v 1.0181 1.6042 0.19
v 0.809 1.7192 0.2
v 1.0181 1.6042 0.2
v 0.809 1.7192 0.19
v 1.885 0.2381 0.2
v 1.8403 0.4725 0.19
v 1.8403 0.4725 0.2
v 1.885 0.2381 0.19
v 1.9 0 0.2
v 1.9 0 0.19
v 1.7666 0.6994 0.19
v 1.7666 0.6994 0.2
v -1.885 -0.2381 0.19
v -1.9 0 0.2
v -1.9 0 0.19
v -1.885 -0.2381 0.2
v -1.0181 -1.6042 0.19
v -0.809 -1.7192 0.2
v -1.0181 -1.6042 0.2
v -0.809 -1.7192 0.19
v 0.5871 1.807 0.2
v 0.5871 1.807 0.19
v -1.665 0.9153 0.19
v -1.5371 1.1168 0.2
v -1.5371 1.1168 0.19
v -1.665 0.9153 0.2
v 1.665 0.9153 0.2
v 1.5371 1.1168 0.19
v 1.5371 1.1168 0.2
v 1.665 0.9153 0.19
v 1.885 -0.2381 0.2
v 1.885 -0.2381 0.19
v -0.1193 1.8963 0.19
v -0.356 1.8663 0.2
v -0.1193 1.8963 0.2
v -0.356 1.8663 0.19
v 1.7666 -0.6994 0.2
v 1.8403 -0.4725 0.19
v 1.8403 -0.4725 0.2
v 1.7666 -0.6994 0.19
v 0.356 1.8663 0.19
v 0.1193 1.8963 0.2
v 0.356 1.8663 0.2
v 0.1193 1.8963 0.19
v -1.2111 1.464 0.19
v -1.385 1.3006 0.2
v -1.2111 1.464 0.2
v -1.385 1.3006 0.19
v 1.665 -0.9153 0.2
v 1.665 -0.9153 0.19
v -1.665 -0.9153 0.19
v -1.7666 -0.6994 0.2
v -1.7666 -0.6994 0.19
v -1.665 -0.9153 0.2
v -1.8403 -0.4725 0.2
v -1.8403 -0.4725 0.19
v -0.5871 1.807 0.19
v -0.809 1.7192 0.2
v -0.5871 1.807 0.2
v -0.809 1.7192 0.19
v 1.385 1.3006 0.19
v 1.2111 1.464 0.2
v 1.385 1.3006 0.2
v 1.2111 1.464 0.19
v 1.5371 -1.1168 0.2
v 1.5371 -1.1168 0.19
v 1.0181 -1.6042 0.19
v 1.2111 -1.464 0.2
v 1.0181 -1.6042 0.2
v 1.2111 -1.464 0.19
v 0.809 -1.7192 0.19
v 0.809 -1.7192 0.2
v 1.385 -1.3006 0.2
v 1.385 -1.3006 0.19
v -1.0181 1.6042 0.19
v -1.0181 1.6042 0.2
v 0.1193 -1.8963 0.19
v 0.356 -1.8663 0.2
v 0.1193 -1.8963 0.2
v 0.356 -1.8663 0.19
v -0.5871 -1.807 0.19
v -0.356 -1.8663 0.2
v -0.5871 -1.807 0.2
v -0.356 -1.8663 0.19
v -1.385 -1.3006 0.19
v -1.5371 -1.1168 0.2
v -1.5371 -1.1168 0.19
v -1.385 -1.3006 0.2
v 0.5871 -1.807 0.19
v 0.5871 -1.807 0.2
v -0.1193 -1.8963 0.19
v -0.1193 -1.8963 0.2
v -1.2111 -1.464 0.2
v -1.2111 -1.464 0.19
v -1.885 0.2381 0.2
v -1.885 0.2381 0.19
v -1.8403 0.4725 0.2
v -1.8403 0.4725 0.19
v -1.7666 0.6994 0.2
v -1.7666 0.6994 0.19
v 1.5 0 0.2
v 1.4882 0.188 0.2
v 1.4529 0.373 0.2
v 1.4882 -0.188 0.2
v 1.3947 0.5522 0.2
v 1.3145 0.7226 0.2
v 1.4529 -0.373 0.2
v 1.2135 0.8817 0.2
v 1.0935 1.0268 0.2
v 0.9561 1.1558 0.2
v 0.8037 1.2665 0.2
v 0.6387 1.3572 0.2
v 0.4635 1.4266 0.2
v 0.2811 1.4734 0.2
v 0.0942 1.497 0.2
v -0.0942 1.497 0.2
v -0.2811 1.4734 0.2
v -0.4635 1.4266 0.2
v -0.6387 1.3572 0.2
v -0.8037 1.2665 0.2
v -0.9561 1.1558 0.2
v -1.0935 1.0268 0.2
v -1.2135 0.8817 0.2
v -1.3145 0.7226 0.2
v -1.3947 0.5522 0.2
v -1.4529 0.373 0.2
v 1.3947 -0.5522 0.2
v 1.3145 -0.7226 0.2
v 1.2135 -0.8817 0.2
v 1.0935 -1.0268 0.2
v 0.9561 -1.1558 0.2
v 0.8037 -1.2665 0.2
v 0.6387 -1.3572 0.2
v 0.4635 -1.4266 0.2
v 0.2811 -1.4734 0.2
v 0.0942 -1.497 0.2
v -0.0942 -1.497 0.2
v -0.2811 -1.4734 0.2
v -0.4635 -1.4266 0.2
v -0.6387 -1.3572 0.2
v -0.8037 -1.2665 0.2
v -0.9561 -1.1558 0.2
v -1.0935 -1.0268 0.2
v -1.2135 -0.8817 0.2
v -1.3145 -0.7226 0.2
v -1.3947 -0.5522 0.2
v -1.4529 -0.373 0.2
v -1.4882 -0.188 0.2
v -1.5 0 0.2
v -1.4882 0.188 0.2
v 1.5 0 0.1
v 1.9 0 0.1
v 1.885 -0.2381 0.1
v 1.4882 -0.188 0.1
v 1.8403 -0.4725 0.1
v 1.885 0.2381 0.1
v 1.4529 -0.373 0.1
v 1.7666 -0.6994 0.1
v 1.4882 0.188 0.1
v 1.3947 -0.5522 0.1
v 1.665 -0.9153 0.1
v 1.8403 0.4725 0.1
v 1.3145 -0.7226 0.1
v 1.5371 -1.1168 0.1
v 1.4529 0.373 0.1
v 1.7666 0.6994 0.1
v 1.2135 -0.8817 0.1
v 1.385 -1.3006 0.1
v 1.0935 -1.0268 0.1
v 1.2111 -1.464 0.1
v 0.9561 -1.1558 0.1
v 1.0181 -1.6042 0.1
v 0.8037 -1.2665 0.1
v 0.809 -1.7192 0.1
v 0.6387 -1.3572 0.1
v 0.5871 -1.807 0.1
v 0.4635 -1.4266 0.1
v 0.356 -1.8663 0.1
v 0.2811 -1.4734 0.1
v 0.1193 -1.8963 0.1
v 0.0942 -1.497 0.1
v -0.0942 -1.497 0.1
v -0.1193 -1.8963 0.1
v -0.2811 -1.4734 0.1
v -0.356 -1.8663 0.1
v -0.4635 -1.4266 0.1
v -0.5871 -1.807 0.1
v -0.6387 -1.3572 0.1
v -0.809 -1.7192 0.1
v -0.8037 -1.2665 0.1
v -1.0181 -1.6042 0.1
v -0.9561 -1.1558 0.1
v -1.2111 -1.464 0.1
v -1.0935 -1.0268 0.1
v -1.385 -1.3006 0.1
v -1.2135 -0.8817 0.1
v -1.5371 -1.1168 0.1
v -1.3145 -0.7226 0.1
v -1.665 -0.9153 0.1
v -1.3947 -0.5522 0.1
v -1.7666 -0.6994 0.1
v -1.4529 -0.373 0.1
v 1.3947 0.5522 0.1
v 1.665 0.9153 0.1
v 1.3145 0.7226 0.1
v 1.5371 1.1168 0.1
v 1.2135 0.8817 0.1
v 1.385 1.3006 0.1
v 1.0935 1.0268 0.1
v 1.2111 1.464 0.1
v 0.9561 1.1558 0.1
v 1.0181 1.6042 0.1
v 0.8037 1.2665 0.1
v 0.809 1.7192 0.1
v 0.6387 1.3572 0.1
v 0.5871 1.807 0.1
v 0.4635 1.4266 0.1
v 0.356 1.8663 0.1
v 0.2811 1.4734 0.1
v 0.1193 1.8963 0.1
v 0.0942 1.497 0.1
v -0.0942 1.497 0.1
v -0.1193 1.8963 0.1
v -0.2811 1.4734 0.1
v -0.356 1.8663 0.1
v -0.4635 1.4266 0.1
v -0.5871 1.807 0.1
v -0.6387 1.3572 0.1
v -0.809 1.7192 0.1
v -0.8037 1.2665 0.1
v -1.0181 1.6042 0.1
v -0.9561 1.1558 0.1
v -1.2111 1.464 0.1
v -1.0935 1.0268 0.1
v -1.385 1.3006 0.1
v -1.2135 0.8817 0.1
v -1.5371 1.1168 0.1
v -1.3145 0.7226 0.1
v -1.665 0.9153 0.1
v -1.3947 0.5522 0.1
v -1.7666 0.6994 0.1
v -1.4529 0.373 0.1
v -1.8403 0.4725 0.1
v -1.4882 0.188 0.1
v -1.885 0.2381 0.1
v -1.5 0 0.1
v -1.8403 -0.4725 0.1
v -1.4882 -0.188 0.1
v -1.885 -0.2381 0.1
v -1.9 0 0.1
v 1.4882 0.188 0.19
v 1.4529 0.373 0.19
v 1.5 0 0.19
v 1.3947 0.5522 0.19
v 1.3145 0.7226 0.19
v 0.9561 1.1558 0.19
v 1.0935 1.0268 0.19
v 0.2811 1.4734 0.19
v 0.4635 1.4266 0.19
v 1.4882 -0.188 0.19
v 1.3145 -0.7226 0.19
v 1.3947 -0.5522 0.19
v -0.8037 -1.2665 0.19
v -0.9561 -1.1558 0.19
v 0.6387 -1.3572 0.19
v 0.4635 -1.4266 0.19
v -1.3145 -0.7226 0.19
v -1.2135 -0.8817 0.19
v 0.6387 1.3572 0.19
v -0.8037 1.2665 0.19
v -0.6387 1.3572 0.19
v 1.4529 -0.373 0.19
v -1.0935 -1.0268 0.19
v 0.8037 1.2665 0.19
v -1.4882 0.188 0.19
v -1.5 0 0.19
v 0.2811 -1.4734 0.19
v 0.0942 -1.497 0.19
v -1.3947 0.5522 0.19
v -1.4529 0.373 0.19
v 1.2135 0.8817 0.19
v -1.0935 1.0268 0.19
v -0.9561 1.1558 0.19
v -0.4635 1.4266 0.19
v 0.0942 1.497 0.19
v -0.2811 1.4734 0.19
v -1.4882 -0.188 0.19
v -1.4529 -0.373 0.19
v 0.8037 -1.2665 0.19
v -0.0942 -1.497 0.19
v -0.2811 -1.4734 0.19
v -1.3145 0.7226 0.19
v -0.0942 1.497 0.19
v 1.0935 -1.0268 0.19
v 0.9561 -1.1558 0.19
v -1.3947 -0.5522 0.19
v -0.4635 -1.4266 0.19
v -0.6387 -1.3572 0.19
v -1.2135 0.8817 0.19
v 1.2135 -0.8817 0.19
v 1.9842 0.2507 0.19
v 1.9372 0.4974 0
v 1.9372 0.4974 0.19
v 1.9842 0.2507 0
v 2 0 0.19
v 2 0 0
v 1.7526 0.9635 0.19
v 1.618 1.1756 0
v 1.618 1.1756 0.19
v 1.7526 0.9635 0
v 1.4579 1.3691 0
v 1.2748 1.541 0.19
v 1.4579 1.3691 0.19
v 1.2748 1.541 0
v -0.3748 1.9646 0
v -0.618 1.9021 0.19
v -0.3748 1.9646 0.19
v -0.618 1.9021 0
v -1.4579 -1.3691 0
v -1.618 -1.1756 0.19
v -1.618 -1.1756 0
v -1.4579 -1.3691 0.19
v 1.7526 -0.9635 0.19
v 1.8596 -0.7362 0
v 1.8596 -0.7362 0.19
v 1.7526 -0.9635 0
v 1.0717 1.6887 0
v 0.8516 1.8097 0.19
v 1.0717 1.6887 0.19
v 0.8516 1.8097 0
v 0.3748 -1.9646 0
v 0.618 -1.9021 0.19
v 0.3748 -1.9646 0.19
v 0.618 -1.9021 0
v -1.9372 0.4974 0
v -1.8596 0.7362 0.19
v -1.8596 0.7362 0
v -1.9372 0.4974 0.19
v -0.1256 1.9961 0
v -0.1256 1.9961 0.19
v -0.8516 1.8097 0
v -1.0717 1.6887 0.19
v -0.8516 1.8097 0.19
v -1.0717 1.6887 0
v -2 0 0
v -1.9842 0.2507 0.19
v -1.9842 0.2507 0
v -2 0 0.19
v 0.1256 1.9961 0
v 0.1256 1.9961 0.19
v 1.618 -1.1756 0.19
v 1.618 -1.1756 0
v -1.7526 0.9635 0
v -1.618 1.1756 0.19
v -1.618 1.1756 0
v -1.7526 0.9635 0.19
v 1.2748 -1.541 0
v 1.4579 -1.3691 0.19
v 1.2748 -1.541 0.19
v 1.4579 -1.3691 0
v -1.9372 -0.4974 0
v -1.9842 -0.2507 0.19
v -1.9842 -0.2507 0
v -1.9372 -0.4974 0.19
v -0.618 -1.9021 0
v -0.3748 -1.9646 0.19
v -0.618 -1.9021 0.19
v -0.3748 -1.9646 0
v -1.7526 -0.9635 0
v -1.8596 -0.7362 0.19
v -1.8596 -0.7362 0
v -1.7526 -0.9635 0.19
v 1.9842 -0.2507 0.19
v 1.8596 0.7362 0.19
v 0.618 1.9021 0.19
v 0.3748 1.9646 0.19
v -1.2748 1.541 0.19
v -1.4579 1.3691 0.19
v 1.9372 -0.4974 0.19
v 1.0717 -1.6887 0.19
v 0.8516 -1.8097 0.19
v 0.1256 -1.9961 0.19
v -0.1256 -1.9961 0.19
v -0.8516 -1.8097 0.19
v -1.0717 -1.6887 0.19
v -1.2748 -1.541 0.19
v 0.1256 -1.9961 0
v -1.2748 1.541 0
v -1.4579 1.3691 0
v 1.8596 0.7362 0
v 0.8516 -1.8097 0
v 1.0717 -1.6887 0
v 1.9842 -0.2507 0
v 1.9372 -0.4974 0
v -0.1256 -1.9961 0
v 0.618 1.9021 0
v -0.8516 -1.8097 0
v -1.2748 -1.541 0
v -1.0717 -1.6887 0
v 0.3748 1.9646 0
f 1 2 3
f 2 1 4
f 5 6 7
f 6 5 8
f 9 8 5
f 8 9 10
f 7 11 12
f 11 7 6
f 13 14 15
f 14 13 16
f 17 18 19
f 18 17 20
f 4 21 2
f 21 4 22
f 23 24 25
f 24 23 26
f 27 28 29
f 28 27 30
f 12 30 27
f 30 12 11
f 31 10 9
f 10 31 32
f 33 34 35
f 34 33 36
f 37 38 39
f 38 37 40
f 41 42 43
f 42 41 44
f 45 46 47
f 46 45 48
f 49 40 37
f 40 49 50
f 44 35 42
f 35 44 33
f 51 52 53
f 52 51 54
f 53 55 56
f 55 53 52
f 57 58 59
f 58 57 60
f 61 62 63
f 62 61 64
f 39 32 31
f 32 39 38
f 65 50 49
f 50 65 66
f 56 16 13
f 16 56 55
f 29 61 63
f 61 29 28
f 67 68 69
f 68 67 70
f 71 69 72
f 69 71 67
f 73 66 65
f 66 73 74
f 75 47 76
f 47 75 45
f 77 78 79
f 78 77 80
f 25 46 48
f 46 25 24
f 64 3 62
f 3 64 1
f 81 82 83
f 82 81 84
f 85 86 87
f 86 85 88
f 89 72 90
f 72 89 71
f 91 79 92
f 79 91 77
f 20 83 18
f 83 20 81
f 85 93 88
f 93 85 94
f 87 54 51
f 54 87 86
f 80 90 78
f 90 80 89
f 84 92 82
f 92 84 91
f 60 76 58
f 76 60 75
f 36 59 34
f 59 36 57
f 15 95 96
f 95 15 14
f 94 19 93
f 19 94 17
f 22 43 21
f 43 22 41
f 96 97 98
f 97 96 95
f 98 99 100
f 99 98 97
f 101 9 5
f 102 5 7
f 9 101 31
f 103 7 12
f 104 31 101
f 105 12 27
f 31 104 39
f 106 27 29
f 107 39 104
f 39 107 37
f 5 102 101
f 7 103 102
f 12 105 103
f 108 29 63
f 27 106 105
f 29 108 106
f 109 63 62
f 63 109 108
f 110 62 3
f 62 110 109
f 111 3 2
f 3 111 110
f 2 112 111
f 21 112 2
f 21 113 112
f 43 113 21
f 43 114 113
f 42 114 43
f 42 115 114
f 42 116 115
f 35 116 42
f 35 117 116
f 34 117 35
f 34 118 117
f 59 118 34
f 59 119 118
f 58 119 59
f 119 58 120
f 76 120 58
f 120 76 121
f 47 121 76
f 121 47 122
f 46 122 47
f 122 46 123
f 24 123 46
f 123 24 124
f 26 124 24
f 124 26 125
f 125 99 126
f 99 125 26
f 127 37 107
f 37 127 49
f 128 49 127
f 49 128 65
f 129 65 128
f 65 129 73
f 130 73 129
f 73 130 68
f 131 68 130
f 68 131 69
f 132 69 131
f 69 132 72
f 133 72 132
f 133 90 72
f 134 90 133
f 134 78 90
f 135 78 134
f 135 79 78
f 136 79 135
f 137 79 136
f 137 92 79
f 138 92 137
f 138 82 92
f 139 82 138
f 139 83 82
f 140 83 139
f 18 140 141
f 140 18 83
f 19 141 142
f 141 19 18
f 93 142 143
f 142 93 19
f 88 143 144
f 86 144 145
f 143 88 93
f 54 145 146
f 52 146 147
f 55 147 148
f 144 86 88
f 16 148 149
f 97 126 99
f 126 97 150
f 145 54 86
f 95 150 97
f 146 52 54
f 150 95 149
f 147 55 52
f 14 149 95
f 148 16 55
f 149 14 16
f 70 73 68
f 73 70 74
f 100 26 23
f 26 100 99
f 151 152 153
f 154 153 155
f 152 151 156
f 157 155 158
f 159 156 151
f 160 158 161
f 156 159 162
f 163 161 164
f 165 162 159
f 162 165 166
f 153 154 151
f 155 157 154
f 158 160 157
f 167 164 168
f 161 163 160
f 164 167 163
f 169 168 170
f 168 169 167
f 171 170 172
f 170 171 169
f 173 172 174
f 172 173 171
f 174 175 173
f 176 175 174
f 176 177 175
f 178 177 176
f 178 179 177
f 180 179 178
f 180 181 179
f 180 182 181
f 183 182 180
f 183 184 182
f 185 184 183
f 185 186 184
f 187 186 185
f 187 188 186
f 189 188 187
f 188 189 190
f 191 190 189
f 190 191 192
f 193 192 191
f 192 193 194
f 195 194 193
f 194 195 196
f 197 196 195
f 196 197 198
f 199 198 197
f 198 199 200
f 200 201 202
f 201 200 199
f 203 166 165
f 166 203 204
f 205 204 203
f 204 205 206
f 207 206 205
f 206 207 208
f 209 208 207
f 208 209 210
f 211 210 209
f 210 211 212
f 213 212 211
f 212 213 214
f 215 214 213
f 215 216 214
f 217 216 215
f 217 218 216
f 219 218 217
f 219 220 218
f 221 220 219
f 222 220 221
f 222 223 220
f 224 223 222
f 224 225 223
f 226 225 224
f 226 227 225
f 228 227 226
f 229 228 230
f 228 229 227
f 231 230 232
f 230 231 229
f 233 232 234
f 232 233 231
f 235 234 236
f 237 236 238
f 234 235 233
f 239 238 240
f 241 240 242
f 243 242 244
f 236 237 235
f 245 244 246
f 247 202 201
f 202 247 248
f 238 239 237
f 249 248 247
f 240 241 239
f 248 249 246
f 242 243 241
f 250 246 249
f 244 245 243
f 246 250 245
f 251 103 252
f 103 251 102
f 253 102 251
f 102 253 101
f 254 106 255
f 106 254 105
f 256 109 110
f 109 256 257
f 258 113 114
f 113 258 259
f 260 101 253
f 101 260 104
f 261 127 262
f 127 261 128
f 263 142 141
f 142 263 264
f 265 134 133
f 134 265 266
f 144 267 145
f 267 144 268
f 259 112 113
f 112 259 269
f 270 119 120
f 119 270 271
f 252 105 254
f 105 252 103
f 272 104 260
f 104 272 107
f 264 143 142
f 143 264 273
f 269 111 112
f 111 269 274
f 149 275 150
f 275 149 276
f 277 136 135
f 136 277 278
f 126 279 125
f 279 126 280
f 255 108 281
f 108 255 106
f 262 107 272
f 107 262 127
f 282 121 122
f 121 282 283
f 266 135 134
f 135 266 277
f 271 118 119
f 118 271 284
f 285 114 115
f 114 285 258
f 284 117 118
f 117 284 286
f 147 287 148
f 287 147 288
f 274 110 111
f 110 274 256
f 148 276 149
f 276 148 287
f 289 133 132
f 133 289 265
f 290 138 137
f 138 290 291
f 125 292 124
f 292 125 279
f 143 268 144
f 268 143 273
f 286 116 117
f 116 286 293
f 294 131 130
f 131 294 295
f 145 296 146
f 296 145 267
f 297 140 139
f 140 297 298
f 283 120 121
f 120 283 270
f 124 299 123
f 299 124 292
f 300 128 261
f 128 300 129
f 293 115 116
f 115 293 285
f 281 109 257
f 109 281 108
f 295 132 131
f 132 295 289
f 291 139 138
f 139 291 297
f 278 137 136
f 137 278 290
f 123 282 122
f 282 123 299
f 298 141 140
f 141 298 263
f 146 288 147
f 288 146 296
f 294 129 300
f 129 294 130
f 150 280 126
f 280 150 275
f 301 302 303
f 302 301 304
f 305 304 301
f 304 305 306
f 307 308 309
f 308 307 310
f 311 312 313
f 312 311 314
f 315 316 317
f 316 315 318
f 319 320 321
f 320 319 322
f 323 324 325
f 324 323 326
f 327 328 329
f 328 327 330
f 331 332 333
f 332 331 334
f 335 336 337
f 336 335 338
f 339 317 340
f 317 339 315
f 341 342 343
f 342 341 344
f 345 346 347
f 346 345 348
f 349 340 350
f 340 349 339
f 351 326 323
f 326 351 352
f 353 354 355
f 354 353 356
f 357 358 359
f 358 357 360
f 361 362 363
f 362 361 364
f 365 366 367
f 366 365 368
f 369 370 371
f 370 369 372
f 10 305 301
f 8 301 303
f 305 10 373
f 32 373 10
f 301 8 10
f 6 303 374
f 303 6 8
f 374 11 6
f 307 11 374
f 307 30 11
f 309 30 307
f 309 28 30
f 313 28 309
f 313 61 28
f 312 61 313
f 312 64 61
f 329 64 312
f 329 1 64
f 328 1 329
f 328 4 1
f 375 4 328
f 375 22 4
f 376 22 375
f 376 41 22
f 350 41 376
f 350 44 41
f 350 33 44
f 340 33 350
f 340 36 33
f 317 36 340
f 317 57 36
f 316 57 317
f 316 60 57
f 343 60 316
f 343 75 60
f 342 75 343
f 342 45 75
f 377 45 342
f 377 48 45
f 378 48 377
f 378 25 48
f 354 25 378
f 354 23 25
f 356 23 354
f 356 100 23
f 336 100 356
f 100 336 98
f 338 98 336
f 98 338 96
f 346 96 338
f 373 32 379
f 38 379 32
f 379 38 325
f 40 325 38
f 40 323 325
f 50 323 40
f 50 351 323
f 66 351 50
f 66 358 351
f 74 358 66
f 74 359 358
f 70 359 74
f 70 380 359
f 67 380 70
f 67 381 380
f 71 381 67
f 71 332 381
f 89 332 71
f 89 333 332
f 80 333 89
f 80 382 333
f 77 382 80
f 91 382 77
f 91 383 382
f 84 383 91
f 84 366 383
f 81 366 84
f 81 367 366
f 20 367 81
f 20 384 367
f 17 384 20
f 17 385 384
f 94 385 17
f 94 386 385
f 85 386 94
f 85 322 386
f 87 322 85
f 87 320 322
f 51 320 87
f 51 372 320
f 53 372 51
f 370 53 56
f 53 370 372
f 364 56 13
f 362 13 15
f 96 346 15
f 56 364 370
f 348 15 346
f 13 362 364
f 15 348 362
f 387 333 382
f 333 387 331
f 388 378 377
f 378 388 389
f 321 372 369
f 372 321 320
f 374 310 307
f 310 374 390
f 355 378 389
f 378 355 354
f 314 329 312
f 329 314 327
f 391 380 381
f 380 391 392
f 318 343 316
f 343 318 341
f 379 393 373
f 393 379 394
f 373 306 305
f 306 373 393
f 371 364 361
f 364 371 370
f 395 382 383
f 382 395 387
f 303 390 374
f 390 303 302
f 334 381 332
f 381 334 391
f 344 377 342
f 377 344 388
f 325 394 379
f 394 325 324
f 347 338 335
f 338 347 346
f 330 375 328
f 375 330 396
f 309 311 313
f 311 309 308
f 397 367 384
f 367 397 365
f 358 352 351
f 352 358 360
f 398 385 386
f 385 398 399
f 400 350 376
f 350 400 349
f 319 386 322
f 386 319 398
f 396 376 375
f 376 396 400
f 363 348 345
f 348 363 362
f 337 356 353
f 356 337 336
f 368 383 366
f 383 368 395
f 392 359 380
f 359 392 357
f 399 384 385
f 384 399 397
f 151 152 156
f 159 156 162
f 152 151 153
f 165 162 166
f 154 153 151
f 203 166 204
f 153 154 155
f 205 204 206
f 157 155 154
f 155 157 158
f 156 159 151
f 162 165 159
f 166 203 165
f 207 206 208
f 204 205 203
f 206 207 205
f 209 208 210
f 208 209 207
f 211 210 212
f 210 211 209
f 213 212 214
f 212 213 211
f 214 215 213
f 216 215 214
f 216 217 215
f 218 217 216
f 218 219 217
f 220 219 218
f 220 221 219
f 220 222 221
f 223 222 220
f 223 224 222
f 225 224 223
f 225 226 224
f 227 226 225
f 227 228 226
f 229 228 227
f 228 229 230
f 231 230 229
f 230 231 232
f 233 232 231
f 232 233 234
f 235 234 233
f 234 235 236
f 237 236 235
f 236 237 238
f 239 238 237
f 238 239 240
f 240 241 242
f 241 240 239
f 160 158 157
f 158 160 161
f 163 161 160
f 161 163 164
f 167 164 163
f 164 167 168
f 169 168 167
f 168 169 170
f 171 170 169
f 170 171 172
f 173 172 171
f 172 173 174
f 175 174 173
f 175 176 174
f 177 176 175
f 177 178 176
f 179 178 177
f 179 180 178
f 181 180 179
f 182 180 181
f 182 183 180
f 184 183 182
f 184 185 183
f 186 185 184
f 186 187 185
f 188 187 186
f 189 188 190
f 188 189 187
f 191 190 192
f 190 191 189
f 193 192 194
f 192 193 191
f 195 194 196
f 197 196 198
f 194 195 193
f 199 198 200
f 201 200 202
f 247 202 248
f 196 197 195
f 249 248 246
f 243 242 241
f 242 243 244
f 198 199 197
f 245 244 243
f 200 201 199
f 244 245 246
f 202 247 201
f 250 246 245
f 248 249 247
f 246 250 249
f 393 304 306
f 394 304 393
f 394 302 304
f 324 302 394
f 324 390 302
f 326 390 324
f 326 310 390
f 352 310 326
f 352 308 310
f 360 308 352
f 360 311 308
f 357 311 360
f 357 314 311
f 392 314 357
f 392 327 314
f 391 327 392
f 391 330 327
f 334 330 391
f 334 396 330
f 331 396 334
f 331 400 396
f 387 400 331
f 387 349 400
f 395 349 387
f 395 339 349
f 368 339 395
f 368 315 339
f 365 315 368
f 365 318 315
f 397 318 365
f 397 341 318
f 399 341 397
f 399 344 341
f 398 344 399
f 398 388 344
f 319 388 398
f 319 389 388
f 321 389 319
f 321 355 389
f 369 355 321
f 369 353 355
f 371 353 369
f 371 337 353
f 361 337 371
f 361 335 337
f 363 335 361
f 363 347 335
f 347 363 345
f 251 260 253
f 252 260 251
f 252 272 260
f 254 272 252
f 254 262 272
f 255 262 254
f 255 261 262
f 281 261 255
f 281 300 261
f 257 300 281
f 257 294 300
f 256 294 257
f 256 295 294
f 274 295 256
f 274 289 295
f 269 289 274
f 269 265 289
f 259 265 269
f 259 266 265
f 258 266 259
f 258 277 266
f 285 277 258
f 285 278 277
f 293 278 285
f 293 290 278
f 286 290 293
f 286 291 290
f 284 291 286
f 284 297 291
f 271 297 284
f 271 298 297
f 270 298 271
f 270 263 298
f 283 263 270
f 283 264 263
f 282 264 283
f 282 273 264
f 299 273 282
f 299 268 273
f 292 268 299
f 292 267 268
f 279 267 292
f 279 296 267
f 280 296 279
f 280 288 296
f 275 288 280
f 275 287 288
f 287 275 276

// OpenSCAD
Red_Size = 1.5;

color("gray")
cylinder(h = 0.1, r1 = 2,r2 = 2,$fn = 50);
translate([0,0,0.1]

)
difference(){
    color("red")
    cylinder(h = 0.1, r1 = 1.9,r2 = 1.9,$fn = 50);
    cylinder(h = 0.2, r1 = 1.5,r2 = 1.5,$fn = 50);

}

translate([0,0,0.09])
difference(){
    color("white")
    cylinder(h = 0.1, r1 = 2,r2 = 2,$fn = 50);
    cylinder(h = 0.2, r1 = 1.9,r2 = 1.9,$fn = 50);
}

color("white")
translate([0,0,0.09])
cylinder(h = 0.1, r1 = 1.5,r2 = 1.5,$fn = 50);
